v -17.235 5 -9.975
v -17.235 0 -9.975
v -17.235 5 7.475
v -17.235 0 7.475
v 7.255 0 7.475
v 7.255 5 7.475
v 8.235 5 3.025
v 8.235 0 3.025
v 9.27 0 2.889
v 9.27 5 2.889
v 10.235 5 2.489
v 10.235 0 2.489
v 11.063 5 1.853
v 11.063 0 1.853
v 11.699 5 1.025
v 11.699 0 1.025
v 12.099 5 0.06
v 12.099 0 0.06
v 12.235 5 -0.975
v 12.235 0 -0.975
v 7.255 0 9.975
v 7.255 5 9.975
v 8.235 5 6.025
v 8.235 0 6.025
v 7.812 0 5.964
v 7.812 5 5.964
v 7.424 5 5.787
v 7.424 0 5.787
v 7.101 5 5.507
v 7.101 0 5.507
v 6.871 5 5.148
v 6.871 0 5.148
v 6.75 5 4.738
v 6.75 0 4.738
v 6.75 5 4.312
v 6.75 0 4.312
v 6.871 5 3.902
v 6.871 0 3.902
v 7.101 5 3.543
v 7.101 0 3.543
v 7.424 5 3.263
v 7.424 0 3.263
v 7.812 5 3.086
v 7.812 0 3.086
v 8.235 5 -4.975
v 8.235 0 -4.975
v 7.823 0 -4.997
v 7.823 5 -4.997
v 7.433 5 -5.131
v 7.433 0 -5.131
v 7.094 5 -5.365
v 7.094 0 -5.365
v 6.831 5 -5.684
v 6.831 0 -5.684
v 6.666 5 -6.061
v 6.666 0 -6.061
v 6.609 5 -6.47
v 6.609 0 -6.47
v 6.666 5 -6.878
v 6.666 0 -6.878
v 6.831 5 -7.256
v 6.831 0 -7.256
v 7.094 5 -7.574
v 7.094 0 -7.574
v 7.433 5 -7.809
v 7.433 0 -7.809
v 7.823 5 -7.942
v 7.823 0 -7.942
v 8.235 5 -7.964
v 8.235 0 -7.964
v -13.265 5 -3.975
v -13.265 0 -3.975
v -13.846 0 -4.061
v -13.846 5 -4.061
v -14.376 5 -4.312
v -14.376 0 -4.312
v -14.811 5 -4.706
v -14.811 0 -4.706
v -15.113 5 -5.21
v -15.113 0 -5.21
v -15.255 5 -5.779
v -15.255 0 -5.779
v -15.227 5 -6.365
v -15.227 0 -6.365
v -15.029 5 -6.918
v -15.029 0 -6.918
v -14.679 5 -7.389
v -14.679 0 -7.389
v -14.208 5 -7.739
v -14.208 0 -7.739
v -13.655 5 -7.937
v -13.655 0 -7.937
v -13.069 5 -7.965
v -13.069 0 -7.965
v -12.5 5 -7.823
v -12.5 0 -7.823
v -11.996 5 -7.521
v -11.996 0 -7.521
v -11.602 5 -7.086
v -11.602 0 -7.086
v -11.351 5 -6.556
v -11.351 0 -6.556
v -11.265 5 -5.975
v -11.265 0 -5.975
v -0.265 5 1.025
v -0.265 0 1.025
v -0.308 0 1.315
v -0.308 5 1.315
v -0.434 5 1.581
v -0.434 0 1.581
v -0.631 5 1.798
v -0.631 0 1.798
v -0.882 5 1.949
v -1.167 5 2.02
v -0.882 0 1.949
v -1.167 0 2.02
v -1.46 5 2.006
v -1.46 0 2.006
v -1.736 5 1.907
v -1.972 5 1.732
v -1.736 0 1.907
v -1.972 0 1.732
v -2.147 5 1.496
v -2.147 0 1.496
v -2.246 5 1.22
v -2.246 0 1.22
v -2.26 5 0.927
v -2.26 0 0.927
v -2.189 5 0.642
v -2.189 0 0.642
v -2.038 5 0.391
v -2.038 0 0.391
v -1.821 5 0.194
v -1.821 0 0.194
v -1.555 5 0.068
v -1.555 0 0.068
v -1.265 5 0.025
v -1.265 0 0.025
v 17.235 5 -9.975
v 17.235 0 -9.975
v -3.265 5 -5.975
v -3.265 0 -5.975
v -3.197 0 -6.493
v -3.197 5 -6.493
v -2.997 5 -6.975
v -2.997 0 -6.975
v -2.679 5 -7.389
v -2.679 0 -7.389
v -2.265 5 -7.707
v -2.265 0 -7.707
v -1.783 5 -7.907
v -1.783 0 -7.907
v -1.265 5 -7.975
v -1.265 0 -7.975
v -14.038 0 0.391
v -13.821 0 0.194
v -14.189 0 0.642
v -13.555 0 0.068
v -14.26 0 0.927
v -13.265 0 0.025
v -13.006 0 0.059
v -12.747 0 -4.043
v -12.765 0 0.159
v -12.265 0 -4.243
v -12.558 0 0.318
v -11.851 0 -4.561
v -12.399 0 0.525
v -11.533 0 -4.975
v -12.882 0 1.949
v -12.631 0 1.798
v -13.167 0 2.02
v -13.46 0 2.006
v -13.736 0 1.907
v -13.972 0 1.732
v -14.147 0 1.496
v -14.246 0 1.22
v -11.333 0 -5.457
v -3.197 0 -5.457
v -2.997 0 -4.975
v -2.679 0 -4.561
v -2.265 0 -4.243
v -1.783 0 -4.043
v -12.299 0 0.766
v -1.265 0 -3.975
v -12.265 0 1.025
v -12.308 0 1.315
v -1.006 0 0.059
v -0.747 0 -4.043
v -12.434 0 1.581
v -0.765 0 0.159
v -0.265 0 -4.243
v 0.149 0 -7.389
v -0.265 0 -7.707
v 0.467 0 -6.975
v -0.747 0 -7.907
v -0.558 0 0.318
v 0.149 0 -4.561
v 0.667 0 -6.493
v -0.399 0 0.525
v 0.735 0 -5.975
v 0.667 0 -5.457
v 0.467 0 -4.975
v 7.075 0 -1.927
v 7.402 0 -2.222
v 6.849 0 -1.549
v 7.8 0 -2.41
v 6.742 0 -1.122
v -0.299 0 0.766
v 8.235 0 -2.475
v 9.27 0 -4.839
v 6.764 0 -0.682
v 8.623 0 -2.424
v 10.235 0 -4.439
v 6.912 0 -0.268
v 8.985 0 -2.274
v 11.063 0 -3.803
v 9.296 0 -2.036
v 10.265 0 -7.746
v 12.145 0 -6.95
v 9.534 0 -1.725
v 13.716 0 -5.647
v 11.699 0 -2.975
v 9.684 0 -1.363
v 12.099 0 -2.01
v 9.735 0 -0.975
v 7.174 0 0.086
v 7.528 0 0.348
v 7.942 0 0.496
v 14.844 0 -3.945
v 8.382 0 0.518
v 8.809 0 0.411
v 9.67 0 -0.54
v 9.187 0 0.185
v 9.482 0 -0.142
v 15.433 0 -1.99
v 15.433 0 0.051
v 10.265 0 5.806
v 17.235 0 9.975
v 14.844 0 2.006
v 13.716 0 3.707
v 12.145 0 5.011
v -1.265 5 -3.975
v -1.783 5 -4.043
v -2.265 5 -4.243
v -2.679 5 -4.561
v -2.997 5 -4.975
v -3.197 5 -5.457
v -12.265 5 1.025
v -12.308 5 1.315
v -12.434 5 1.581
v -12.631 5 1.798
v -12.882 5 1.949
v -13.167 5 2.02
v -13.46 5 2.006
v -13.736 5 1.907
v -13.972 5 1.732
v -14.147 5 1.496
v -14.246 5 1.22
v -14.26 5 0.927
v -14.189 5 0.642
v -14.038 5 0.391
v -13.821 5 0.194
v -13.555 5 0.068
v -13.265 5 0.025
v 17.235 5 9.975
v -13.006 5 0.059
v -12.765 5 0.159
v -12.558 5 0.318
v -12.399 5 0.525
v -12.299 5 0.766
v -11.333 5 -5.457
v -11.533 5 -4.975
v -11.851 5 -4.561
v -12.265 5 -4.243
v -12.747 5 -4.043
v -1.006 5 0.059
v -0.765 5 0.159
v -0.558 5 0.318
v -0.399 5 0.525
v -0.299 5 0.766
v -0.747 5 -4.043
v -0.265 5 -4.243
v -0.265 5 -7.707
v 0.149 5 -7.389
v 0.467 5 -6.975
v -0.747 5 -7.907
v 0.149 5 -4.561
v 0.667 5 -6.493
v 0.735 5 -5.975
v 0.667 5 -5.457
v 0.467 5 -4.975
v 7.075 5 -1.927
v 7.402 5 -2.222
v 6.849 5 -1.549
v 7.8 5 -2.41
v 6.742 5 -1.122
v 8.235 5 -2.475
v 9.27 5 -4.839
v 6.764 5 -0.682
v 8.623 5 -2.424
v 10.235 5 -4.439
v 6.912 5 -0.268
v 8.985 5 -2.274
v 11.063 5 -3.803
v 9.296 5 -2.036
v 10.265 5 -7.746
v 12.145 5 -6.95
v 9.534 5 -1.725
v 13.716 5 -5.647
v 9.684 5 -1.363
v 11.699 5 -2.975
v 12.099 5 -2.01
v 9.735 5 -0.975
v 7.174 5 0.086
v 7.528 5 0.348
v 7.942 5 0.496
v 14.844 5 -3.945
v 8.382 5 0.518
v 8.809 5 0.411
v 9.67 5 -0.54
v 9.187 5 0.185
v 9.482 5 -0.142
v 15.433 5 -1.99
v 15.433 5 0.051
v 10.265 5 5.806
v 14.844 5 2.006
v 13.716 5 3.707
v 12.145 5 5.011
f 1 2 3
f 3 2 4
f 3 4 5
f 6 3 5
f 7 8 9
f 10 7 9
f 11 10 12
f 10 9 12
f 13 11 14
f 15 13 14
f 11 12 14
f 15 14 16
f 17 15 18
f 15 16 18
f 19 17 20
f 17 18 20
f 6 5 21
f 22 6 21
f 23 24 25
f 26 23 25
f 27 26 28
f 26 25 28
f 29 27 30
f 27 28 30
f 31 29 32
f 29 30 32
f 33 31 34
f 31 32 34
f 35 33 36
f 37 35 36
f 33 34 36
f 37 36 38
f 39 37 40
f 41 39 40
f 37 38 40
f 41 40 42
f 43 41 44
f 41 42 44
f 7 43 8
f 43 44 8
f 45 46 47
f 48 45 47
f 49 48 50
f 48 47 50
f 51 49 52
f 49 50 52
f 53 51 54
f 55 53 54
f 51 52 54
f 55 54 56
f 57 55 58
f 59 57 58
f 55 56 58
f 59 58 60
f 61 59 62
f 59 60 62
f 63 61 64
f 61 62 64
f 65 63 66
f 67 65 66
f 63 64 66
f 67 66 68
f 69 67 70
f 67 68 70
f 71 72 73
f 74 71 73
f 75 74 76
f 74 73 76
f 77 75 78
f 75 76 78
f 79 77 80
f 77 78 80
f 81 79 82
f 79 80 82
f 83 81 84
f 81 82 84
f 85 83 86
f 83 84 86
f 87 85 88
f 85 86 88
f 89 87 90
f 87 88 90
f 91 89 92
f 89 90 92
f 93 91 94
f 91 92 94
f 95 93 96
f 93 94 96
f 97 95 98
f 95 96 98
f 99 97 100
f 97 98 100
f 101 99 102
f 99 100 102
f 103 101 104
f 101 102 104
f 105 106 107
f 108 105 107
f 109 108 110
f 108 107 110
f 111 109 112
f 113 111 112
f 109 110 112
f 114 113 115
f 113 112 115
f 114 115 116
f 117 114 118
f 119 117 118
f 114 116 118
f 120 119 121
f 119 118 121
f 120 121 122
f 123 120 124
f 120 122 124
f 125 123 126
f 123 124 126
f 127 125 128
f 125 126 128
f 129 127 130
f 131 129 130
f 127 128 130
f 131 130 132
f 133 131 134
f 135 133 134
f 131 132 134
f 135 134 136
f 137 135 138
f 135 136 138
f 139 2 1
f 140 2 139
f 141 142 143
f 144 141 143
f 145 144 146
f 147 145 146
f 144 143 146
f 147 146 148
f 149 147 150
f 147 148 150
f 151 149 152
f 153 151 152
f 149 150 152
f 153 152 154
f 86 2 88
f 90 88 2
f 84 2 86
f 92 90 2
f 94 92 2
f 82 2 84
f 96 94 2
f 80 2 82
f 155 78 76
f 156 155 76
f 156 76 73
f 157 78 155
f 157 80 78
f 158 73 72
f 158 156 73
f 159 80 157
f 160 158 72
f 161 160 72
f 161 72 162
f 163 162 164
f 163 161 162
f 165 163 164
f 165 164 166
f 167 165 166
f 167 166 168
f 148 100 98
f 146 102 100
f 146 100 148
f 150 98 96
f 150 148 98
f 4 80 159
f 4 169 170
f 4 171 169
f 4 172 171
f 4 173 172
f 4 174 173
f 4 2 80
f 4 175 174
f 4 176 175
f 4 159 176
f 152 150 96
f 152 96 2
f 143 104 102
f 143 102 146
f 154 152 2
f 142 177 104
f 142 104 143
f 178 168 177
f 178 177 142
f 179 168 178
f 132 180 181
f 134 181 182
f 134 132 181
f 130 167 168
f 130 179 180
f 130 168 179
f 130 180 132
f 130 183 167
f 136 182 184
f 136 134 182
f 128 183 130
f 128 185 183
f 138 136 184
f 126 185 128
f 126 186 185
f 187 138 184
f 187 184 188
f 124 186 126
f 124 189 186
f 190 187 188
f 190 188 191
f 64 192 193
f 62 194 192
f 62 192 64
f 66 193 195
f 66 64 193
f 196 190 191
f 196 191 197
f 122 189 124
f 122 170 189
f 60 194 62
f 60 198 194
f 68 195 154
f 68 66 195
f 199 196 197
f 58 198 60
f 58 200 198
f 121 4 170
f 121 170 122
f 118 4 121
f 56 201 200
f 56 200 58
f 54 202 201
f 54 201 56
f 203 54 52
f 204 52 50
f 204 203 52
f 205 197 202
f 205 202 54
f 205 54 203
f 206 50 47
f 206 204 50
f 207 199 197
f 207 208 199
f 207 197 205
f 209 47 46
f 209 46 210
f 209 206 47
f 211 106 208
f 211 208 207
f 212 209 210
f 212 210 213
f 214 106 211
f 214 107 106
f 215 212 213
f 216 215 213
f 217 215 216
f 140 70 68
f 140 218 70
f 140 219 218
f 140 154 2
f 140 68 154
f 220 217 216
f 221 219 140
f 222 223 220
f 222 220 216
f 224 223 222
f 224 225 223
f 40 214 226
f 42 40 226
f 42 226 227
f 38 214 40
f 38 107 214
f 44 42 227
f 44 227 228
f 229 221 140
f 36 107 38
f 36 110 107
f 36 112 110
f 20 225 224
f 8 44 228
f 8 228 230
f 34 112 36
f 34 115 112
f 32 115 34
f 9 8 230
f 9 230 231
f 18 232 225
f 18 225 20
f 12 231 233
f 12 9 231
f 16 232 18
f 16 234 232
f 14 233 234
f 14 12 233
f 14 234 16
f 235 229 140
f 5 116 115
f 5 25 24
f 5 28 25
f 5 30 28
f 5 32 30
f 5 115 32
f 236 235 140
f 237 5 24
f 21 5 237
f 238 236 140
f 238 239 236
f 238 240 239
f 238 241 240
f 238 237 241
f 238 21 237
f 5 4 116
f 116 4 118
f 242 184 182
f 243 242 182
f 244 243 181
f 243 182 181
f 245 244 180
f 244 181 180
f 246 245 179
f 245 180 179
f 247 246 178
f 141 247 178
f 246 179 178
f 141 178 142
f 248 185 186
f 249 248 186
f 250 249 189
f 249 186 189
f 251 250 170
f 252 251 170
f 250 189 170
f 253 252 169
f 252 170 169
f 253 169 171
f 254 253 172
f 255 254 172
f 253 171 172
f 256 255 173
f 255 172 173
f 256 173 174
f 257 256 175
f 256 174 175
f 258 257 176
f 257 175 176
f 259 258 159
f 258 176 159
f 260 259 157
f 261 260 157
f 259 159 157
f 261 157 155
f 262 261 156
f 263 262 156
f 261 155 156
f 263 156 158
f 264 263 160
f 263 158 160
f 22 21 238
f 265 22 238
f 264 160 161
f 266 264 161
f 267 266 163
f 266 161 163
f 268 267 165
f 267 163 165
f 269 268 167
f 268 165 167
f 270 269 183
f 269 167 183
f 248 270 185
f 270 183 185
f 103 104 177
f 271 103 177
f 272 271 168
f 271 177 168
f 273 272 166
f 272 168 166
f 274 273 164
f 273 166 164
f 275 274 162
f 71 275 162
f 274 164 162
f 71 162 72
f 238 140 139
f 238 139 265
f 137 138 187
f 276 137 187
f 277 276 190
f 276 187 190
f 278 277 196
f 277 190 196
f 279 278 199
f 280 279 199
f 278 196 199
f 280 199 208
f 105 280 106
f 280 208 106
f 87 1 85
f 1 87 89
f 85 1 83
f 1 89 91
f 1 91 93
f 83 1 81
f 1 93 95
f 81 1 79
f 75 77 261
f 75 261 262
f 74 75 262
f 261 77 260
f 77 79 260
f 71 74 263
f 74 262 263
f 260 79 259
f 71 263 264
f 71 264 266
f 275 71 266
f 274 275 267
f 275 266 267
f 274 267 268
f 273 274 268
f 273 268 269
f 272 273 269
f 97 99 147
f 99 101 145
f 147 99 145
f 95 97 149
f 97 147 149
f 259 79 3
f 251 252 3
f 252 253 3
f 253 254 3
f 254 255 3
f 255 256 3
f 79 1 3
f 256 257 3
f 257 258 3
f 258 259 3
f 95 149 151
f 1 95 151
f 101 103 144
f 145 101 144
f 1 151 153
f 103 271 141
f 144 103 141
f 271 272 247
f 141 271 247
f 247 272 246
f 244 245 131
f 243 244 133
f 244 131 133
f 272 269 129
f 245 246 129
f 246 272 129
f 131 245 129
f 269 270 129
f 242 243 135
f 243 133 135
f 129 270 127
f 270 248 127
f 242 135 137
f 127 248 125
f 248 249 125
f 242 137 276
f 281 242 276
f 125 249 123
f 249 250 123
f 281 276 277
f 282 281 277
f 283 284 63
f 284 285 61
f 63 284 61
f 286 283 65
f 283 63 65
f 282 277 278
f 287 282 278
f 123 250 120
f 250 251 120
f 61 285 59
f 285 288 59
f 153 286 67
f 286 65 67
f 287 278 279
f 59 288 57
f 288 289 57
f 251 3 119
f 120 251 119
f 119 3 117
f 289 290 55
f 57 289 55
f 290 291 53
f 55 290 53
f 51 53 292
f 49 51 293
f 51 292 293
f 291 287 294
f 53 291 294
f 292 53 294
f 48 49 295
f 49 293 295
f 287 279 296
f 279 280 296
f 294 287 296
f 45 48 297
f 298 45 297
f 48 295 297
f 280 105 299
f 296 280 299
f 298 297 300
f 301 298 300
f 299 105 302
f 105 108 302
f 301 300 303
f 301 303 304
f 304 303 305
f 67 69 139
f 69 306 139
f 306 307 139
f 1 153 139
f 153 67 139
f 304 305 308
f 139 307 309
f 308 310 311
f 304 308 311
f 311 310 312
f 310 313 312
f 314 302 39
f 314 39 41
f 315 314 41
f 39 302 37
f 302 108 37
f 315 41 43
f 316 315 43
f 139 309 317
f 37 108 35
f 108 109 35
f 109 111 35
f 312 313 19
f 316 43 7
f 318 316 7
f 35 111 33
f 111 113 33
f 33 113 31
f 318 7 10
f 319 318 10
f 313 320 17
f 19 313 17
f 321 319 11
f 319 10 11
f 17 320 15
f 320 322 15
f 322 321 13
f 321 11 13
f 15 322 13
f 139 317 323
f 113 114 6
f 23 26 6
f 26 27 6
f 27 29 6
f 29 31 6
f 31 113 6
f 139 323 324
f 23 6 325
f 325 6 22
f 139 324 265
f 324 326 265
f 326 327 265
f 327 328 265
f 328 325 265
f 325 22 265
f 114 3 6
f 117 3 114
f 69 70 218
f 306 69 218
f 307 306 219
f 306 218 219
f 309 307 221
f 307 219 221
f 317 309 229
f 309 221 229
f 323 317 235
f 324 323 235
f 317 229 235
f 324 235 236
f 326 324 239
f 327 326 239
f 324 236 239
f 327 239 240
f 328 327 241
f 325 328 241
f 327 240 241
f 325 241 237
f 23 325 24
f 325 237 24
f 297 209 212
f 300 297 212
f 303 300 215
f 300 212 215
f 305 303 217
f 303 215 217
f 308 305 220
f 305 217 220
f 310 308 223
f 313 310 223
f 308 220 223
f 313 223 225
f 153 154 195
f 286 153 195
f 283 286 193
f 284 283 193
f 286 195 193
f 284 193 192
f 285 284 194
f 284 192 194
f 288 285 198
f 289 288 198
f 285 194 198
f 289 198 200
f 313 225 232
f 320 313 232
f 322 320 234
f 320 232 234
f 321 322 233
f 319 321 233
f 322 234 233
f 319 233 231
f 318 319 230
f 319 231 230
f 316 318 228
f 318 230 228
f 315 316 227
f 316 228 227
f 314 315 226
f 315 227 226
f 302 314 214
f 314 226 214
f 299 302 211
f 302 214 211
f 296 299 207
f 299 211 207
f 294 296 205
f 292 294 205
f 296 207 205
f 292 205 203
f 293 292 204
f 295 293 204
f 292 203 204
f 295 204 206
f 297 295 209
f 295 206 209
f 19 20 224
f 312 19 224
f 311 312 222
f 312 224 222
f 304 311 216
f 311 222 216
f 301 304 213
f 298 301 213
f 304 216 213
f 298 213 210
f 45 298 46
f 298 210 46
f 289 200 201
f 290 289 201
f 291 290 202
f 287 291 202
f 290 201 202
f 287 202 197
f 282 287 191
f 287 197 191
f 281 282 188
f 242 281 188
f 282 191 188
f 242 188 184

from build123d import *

# Parameters (mm, degrees)
F0_W     = 34.47
F0_H     = 19.95
F1_DEPTH = 5
F2_W     = 24.49
F2_H     = 2.5
F3_DEPTH = 5
F5_DEPTH = 5
F7_DEPTH = 5


with BuildPart() as f1:
    # F0 (on Front) → F1 (new body)
    with BuildSketch(Plane.XZ):
        Rectangle(F0_W, F0_H)
    extrude(amount=-F1_DEPTH)

    # F2 (on face) → F3 (cut, through all)
    with BuildSketch(Plane.XZ):
        with Locations((-4.99, 8.725)):
            Rectangle(F2_W, F2_H)
    extrude(amount=-F3_DEPTH, mode=Mode.SUBTRACT)

    # F4 (on face) → F5 (cut, through all)
    with BuildSketch(Plane.XZ):
        with BuildLine():
            ThreePointArc((-3.265, -5.975), (-2.679214, -7.389214), (-1.265, -7.975))
            Line((-1.265, -7.975), (-1.265, -5.975))
            Line((-1.265, -5.975), (-3.265, -5.975))
        make_face()
        with BuildLine():
            ThreePointArc((-12.265, 1.025), (-13.972107, 1.732107), (-13.265, 0.025))
            ThreePointArc((-13.265, 0.025), (-12.557893, 0.317893), (-12.265, 1.025))
        make_face()
        with BuildLine():
            ThreePointArc((-13.265, -3.975), (-14.679214, -7.389214), (-11.265, -5.975))
            Line((-11.265, -5.975), (-13.265, -5.975))
            Line((-13.265, -5.975), (-13.265, -3.975))
        make_face()
        with BuildLine():
            Line((-13.265, -5.975), (-11.265, -5.975))
            ThreePointArc((-11.265, -5.975), (-11.850786, -4.560786), (-13.265, -3.975))
            Line((-13.265, -3.975), (-13.265, -5.975))
        make_face()
        with BuildLine():
            ThreePointArc((-0.265, 1.025), (-1.972107, 1.732107), (-1.265, 0.025))
            ThreePointArc((-1.265, 0.025), (-0.557893, 0.317893), (-0.265, 1.025))
        make_face()
        with BuildLine():
            Line((-1.265, -5.975), (-1.265, -7.975))
            ThreePointArc((-1.265, -7.975), (0.149214, -7.389214), (0.735, -5.975))
            ThreePointArc((0.735, -5.975), (0.149214, -4.560786), (-1.265, -3.975))
            Line((-1.265, -3.975), (-1.265, -5.975))
        make_face()
        with BuildLine():
            Line((-3.265, -5.975), (-1.265, -5.975))
            Line((-1.265, -5.975), (-1.265, -3.975))
            ThreePointArc((-1.265, -3.975), (-2.679214, -4.560786), (-3.265, -5.975))
        make_face()
    extrude(amount=-F5_DEPTH, mode=Mode.SUBTRACT)

    # F6 (on face) → F7 (cut, through all)
    with BuildSketch(Plane.XZ):
        with BuildLine():
            ThreePointArc((8.235, -4.975), (6.608983, -6.469697), (8.235, -7.964394))
            Line((8.235, -7.964394), (8.235, -4.975))
        make_face()
        with BuildLine():
            Line((8.235, -4.975), (8.235, -7.964394))
            ThreePointArc((8.235, -7.964394), (15.507417, -0.969697), (8.235, 6.025))
            ThreePointArc((8.235, 6.025), (6.735, 4.525), (8.235, 3.025))
            ThreePointArc((8.235, 3.025), (11.063427, 1.853427), (12.235, -0.975))
            ThreePointArc((12.235, -0.975), (11.063427, -3.803427), (8.235, -4.975))
        make_face()
        with BuildLine():
            ThreePointArc((9.735, -0.975), (7.17434, 0.08566), (8.235, -2.475))
            ThreePointArc((8.235, -2.475), (9.29566, -2.03566), (9.735, -0.975))
        make_face()
    extrude(amount=-F7_DEPTH, mode=Mode.SUBTRACT)


solid = f1.part
